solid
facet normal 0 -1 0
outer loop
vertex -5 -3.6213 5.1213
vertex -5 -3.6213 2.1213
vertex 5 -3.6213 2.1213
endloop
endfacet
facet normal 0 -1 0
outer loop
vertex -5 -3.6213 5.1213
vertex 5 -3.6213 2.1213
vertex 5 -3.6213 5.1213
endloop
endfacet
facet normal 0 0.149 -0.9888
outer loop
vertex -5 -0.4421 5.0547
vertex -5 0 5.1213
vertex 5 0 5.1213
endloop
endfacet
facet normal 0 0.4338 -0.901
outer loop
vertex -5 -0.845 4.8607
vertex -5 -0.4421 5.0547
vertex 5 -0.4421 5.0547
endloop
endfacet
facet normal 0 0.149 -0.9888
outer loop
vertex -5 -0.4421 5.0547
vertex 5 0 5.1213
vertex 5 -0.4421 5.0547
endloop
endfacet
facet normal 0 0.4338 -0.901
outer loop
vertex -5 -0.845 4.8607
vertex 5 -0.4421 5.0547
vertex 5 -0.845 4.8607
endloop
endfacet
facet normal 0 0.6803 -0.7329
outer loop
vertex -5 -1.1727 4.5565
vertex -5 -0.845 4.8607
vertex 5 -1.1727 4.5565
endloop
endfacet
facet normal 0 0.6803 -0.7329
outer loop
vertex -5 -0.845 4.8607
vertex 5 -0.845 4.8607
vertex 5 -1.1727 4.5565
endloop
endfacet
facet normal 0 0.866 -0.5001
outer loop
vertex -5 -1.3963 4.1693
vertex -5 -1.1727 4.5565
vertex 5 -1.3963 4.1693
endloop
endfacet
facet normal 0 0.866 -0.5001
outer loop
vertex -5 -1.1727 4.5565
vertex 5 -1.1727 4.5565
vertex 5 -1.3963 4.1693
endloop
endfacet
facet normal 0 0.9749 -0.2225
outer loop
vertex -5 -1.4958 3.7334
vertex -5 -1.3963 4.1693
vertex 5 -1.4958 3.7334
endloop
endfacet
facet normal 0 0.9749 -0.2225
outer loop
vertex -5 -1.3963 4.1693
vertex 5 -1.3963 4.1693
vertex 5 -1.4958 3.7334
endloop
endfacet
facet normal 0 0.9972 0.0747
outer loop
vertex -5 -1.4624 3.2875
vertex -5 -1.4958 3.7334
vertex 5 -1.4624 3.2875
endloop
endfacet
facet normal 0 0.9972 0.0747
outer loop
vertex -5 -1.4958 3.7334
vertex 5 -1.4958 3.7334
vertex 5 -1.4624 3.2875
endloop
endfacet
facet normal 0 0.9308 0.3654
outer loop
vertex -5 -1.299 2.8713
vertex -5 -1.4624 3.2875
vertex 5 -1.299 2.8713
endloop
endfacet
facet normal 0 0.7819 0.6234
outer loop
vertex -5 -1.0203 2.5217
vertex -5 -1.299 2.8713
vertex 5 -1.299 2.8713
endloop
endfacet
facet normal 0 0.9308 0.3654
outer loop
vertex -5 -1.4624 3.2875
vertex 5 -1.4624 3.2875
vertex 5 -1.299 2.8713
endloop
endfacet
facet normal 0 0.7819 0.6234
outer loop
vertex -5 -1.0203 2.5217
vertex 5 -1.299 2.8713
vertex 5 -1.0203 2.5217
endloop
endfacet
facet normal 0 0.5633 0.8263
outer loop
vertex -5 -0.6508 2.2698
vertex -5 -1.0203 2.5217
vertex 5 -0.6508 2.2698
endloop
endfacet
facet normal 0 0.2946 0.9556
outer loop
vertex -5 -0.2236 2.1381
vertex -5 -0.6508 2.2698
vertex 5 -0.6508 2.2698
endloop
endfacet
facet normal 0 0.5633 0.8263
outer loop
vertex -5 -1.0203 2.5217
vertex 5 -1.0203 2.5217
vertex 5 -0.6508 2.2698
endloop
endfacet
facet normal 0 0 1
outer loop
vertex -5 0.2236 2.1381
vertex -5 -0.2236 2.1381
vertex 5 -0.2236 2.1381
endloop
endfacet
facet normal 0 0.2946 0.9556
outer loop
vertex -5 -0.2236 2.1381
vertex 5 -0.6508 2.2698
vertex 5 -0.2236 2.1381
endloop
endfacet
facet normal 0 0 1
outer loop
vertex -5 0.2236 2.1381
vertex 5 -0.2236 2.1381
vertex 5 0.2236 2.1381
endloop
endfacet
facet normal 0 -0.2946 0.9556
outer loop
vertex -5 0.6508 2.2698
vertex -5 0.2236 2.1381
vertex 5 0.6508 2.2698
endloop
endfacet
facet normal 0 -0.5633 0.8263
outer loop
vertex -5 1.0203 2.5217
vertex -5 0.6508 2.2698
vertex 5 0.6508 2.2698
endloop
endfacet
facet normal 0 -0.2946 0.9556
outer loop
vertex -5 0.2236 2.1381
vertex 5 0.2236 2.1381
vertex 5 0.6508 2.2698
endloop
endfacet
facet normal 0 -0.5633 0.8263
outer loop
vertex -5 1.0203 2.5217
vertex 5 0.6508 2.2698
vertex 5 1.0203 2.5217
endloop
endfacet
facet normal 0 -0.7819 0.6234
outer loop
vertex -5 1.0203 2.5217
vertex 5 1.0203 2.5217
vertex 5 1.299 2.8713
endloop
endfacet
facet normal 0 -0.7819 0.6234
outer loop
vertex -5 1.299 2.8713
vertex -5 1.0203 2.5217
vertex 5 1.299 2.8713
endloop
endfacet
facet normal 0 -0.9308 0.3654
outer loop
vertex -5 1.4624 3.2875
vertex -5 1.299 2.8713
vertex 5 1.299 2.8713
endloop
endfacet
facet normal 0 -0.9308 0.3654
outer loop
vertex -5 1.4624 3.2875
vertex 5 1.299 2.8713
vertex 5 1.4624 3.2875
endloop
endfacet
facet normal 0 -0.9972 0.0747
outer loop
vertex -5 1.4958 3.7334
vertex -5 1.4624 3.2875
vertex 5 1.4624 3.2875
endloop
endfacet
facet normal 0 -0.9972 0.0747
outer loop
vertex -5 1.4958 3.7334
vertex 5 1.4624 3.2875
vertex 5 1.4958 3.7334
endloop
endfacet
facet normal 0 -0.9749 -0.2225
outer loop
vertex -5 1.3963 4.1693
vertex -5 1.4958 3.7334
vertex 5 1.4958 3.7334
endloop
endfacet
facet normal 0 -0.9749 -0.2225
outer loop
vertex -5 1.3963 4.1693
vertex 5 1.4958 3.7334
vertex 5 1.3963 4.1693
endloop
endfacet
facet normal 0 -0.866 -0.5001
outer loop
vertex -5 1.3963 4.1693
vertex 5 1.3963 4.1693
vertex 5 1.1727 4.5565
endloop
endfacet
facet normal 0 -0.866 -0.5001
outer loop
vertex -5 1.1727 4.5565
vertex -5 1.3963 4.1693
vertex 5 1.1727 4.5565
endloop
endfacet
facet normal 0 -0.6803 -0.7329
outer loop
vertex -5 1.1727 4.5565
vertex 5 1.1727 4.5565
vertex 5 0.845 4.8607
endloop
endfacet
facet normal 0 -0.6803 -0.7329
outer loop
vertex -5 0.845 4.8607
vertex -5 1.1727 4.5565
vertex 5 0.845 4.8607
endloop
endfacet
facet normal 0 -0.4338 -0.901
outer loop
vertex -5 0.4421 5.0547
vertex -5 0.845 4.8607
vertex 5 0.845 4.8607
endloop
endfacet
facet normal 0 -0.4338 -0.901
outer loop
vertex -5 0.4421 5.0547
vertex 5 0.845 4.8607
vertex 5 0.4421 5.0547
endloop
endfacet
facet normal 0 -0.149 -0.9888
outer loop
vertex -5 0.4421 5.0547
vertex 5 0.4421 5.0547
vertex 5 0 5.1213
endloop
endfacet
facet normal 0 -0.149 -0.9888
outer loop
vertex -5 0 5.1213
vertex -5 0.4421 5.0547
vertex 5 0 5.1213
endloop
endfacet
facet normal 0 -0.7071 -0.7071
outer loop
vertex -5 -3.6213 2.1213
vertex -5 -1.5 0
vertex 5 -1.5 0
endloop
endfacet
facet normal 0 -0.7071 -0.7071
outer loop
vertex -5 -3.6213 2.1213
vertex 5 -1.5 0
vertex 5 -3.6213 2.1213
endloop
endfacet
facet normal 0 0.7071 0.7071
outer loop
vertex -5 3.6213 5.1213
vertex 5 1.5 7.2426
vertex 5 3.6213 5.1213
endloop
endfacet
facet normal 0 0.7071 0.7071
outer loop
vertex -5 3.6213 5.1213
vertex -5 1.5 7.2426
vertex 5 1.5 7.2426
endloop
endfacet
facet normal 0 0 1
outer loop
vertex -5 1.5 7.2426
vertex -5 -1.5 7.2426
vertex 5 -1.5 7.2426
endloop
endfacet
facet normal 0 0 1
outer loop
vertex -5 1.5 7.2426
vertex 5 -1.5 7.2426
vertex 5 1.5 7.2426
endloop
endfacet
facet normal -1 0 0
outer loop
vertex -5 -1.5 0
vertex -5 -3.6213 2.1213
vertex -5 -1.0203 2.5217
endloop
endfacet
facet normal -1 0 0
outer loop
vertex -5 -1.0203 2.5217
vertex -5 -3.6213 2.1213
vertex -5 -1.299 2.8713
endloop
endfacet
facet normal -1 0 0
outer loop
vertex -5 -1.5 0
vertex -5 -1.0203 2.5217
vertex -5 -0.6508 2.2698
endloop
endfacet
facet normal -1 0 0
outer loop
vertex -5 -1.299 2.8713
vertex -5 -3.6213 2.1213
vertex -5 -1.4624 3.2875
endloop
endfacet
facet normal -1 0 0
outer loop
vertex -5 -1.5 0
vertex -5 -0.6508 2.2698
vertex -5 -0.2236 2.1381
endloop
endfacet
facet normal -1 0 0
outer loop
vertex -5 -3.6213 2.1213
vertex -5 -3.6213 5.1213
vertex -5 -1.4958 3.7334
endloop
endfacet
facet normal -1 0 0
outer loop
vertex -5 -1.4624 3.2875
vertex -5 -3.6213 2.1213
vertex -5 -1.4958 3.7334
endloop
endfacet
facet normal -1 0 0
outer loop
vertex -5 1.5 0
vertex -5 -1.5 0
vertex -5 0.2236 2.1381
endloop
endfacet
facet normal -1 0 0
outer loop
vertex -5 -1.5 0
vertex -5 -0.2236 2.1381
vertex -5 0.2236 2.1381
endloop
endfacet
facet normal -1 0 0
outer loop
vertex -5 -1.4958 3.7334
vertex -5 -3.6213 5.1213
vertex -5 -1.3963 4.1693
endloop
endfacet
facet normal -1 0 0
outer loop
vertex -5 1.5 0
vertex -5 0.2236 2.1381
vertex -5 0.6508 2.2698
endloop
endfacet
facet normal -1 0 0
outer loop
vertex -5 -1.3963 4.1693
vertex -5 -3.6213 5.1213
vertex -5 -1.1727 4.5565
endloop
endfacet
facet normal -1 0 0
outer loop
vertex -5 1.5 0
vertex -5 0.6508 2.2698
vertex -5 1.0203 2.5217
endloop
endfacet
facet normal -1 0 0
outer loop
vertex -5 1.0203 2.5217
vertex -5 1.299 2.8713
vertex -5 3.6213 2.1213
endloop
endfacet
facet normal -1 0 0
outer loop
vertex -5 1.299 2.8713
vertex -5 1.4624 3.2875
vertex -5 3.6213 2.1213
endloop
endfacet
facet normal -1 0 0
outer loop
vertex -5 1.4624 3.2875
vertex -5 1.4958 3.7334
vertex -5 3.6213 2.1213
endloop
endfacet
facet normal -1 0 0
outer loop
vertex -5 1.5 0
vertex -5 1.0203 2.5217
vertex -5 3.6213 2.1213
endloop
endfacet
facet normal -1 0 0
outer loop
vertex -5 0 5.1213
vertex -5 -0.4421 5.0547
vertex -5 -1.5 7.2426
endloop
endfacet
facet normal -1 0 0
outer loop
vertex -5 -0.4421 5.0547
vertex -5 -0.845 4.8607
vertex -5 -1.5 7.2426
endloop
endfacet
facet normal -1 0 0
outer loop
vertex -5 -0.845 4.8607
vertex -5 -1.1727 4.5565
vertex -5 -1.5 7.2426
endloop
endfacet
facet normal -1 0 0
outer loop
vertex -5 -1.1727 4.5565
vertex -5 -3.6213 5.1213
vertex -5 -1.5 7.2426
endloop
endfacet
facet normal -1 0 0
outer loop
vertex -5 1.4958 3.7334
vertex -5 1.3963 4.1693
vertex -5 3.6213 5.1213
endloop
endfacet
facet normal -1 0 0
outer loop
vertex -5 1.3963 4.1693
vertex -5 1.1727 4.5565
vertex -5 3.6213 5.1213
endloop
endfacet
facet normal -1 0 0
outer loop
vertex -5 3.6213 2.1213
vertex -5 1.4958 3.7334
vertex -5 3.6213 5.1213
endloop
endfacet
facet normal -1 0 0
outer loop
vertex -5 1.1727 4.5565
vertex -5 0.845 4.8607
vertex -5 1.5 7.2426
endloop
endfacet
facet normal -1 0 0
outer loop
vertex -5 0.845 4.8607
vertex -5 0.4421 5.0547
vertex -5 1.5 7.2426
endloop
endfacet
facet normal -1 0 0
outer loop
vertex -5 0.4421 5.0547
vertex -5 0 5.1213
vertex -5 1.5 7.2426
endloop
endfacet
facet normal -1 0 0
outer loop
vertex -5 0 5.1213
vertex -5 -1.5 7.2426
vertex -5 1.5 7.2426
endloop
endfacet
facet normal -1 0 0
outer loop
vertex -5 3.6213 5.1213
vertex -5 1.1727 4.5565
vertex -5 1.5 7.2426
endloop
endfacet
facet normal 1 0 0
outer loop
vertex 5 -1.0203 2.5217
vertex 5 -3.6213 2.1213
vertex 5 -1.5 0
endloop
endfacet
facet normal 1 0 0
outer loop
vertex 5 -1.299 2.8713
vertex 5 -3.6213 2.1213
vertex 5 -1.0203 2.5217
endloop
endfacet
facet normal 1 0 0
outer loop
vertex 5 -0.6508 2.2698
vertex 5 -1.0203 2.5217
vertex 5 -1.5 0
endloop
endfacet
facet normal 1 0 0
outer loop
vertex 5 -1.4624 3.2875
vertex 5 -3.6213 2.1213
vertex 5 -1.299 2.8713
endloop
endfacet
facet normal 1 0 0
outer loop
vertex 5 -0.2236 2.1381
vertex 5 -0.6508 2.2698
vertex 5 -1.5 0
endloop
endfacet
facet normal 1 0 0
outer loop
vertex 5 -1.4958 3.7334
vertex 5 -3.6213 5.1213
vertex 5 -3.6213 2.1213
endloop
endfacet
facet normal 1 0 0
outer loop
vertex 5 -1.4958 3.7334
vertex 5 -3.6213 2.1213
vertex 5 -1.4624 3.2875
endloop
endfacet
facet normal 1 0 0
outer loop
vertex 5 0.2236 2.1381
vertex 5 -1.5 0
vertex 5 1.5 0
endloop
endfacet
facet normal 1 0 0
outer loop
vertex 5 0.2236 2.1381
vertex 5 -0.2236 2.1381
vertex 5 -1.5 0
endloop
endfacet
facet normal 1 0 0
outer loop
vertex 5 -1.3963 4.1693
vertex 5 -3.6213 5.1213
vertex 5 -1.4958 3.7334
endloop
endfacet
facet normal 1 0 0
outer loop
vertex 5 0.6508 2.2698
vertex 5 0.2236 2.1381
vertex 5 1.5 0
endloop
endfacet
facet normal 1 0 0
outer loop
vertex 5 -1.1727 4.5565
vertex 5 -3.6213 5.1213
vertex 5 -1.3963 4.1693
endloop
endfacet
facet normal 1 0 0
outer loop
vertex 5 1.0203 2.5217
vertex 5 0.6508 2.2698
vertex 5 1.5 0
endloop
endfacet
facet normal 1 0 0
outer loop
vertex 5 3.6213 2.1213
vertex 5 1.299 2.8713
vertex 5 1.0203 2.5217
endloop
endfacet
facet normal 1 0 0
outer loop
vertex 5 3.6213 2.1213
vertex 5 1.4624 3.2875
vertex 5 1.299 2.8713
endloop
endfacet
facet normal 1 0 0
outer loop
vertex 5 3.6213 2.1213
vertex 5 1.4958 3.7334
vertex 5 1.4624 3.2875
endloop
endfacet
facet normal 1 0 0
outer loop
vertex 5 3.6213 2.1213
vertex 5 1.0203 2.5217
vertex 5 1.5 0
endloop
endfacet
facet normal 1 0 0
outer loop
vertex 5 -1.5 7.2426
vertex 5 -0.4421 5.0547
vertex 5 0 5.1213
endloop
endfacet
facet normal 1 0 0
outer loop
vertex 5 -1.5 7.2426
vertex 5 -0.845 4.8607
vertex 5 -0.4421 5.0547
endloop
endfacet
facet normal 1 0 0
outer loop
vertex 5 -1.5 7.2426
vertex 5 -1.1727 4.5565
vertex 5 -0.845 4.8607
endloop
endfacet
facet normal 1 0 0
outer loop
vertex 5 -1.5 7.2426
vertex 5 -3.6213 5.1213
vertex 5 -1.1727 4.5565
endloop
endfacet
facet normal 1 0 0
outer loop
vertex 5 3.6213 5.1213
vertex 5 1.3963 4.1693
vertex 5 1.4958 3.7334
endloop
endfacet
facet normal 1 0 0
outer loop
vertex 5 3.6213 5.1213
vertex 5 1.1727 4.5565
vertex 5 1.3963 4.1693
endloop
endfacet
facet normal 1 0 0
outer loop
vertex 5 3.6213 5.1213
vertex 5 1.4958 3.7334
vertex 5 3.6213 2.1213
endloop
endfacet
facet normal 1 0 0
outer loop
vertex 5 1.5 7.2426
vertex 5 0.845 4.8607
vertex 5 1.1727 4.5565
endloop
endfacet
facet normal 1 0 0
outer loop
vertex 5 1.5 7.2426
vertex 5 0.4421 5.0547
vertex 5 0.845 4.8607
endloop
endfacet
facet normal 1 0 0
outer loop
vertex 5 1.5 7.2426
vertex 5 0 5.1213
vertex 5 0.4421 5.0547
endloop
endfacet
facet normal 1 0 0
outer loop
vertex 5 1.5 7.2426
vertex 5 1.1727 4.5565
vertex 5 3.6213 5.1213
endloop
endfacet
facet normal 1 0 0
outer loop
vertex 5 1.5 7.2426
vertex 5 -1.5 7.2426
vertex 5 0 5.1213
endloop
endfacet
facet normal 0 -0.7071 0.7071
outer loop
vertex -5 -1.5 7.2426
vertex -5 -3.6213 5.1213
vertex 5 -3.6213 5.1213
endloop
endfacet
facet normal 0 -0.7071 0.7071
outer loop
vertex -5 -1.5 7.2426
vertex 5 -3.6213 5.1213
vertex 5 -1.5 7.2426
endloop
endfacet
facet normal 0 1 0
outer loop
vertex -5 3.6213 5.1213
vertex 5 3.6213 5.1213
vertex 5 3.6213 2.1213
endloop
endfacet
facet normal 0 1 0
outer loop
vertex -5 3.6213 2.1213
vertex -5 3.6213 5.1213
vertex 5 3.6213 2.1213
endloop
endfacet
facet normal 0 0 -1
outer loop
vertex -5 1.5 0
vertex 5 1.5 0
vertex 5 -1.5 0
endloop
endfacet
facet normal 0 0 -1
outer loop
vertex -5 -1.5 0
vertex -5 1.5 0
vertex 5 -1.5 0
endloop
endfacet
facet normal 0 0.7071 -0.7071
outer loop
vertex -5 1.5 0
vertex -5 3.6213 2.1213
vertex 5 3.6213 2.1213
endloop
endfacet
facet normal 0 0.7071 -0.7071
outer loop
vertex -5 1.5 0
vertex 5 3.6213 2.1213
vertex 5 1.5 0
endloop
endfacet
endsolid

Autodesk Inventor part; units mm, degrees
ref_plane "YZ Plane" through (0, 0, 0) normal (1, 0, 0) x (0, 1, 0)
ref_plane "XZ Plane" through (0, 0, 0) normal (0, 1, 0) x (-1, 0, 0)
ref_plane "XY Plane" through (0, 0, 0) normal (0, 0, 1) x (1, 0, 0)
sketch "草图1" plane through (0, 0, 0) normal (1, 0, 0) x (0, 1, 0)
  line L0 (3.6213, 2.1213) -> (1.5, 0)
  line L1 (1.5, 0) -> (-1.5, 0)
  line L2 (-1.5, 0) -> (-3.6213, 2.1213)
  line L3 (-3.6213, 2.1213) -> (-3.6213, 5.1213)
  line L4 (-3.6213, 5.1213) -> (-1.5, 7.2426)
  line L5 (-1.5, 7.2426) -> (1.5, 7.2426)
  line L6 (1.5, 7.2426) -> (3.6213, 5.1213)
  line L7 (3.6213, 5.1213) -> (3.6213, 2.1213)
  line L8 (1.608, 0) -> (-1.392, 0) projected
  line L9 (0, 0) -> (0, 9.8594)
  point P0 (0, 3.6213)
  dimension "d0" = 3
extrude "拉伸1" add sketch "草图1" along normal mid plane 10
sketch "草图2" plane through (-5, 0, 0) normal (-1, 0, 0) x (0, 0, 1)
  line L0 (2.1213, -3.6213) -> (5.1213, -3.6213) projected
  line L1 (5.1213, -3.6213) -> (7.2426, -1.5) projected
  line L2 (7.2426, -1.5) -> (7.2426, 1.5) projected
  line L3 (7.2426, 1.5) -> (5.1213, 3.6213) projected
  line L4 (5.1213, 3.6213) -> (2.1213, 3.6213) projected
  line L5 (2.1213, 3.6213) -> (0, 1.5) projected
  line L6 (0, 1.5) -> (0, -1.5) projected
  line L7 (0, -1.5) -> (2.1213, -3.6213) projected
  circle A0 centre (3.6213, 0) radius 1.5
  point P0 (0, 0)
  dimension "d3" = 3
hole "孔1" at (-5, 0, 3.6213) direction (1, 0, 0) diameter 3 end through all
properties part number "关节2"
